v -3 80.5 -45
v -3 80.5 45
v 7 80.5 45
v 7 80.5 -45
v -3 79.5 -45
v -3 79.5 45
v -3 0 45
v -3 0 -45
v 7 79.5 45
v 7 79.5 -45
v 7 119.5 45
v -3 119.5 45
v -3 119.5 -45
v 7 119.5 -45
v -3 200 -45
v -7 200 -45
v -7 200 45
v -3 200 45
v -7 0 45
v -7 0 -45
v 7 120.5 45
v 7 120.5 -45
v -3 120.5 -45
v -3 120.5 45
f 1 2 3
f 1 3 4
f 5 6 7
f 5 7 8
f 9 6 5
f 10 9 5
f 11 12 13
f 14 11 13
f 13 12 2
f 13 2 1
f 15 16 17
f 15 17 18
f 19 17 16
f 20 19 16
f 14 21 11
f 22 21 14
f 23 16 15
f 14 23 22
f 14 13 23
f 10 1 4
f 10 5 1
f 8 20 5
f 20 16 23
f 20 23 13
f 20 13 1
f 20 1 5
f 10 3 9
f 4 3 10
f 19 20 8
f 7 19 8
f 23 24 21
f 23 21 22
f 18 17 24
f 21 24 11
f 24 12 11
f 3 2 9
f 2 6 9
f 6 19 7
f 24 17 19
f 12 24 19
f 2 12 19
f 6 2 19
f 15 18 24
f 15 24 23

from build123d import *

# Parameters (mm, degrees)
SKETCH1_W           = 14
SKETCH1_H           = 90
BOSS_EXTRUDE1_DEPTH = 200
SKETCH2_W           = 10
SKETCH2_H           = 90
CUT_EXTRUDE1_DEPTH  = 206.119477378
SKETCH3_W           = 90
SKETCH3_H           = 1
BOSS_EXTRUDE2_DEPTH = 10


with BuildPart() as part:
    # Sketch1 → Boss-Extrude1 (new body)
    with BuildSketch(Plane(origin=(0, 0, 0), x_dir=(1, 0, 0), z_dir=(0, 1, 0))):
        Rectangle(SKETCH1_W, SKETCH1_H)
    extrude(amount=BOSS_EXTRUDE1_DEPTH)

    # Sketch2 → Cut-Extrude1 (cut, through all)
    with BuildSketch(Plane(origin=(0, 200, 0), x_dir=(1, 0, 0), z_dir=(0, 1, 0))):
        with Locations((2, 0)):
            Rectangle(SKETCH2_W, SKETCH2_H)
    extrude(amount=-CUT_EXTRUDE1_DEPTH, mode=Mode.SUBTRACT)

    # Sketch3 → Boss-Extrude2 (add)
    with BuildSketch(Plane(origin=(-3, 0, 0), x_dir=(0, 0, -1), z_dir=(1, 0, 0))):
        with Locations((0, 120)):
            Rectangle(SKETCH3_W, SKETCH3_H)
        with Locations((0, 80)):
            Rectangle(SKETCH3_W, SKETCH3_H)
    extrude(amount=BOSS_EXTRUDE2_DEPTH)


solid = part.part
